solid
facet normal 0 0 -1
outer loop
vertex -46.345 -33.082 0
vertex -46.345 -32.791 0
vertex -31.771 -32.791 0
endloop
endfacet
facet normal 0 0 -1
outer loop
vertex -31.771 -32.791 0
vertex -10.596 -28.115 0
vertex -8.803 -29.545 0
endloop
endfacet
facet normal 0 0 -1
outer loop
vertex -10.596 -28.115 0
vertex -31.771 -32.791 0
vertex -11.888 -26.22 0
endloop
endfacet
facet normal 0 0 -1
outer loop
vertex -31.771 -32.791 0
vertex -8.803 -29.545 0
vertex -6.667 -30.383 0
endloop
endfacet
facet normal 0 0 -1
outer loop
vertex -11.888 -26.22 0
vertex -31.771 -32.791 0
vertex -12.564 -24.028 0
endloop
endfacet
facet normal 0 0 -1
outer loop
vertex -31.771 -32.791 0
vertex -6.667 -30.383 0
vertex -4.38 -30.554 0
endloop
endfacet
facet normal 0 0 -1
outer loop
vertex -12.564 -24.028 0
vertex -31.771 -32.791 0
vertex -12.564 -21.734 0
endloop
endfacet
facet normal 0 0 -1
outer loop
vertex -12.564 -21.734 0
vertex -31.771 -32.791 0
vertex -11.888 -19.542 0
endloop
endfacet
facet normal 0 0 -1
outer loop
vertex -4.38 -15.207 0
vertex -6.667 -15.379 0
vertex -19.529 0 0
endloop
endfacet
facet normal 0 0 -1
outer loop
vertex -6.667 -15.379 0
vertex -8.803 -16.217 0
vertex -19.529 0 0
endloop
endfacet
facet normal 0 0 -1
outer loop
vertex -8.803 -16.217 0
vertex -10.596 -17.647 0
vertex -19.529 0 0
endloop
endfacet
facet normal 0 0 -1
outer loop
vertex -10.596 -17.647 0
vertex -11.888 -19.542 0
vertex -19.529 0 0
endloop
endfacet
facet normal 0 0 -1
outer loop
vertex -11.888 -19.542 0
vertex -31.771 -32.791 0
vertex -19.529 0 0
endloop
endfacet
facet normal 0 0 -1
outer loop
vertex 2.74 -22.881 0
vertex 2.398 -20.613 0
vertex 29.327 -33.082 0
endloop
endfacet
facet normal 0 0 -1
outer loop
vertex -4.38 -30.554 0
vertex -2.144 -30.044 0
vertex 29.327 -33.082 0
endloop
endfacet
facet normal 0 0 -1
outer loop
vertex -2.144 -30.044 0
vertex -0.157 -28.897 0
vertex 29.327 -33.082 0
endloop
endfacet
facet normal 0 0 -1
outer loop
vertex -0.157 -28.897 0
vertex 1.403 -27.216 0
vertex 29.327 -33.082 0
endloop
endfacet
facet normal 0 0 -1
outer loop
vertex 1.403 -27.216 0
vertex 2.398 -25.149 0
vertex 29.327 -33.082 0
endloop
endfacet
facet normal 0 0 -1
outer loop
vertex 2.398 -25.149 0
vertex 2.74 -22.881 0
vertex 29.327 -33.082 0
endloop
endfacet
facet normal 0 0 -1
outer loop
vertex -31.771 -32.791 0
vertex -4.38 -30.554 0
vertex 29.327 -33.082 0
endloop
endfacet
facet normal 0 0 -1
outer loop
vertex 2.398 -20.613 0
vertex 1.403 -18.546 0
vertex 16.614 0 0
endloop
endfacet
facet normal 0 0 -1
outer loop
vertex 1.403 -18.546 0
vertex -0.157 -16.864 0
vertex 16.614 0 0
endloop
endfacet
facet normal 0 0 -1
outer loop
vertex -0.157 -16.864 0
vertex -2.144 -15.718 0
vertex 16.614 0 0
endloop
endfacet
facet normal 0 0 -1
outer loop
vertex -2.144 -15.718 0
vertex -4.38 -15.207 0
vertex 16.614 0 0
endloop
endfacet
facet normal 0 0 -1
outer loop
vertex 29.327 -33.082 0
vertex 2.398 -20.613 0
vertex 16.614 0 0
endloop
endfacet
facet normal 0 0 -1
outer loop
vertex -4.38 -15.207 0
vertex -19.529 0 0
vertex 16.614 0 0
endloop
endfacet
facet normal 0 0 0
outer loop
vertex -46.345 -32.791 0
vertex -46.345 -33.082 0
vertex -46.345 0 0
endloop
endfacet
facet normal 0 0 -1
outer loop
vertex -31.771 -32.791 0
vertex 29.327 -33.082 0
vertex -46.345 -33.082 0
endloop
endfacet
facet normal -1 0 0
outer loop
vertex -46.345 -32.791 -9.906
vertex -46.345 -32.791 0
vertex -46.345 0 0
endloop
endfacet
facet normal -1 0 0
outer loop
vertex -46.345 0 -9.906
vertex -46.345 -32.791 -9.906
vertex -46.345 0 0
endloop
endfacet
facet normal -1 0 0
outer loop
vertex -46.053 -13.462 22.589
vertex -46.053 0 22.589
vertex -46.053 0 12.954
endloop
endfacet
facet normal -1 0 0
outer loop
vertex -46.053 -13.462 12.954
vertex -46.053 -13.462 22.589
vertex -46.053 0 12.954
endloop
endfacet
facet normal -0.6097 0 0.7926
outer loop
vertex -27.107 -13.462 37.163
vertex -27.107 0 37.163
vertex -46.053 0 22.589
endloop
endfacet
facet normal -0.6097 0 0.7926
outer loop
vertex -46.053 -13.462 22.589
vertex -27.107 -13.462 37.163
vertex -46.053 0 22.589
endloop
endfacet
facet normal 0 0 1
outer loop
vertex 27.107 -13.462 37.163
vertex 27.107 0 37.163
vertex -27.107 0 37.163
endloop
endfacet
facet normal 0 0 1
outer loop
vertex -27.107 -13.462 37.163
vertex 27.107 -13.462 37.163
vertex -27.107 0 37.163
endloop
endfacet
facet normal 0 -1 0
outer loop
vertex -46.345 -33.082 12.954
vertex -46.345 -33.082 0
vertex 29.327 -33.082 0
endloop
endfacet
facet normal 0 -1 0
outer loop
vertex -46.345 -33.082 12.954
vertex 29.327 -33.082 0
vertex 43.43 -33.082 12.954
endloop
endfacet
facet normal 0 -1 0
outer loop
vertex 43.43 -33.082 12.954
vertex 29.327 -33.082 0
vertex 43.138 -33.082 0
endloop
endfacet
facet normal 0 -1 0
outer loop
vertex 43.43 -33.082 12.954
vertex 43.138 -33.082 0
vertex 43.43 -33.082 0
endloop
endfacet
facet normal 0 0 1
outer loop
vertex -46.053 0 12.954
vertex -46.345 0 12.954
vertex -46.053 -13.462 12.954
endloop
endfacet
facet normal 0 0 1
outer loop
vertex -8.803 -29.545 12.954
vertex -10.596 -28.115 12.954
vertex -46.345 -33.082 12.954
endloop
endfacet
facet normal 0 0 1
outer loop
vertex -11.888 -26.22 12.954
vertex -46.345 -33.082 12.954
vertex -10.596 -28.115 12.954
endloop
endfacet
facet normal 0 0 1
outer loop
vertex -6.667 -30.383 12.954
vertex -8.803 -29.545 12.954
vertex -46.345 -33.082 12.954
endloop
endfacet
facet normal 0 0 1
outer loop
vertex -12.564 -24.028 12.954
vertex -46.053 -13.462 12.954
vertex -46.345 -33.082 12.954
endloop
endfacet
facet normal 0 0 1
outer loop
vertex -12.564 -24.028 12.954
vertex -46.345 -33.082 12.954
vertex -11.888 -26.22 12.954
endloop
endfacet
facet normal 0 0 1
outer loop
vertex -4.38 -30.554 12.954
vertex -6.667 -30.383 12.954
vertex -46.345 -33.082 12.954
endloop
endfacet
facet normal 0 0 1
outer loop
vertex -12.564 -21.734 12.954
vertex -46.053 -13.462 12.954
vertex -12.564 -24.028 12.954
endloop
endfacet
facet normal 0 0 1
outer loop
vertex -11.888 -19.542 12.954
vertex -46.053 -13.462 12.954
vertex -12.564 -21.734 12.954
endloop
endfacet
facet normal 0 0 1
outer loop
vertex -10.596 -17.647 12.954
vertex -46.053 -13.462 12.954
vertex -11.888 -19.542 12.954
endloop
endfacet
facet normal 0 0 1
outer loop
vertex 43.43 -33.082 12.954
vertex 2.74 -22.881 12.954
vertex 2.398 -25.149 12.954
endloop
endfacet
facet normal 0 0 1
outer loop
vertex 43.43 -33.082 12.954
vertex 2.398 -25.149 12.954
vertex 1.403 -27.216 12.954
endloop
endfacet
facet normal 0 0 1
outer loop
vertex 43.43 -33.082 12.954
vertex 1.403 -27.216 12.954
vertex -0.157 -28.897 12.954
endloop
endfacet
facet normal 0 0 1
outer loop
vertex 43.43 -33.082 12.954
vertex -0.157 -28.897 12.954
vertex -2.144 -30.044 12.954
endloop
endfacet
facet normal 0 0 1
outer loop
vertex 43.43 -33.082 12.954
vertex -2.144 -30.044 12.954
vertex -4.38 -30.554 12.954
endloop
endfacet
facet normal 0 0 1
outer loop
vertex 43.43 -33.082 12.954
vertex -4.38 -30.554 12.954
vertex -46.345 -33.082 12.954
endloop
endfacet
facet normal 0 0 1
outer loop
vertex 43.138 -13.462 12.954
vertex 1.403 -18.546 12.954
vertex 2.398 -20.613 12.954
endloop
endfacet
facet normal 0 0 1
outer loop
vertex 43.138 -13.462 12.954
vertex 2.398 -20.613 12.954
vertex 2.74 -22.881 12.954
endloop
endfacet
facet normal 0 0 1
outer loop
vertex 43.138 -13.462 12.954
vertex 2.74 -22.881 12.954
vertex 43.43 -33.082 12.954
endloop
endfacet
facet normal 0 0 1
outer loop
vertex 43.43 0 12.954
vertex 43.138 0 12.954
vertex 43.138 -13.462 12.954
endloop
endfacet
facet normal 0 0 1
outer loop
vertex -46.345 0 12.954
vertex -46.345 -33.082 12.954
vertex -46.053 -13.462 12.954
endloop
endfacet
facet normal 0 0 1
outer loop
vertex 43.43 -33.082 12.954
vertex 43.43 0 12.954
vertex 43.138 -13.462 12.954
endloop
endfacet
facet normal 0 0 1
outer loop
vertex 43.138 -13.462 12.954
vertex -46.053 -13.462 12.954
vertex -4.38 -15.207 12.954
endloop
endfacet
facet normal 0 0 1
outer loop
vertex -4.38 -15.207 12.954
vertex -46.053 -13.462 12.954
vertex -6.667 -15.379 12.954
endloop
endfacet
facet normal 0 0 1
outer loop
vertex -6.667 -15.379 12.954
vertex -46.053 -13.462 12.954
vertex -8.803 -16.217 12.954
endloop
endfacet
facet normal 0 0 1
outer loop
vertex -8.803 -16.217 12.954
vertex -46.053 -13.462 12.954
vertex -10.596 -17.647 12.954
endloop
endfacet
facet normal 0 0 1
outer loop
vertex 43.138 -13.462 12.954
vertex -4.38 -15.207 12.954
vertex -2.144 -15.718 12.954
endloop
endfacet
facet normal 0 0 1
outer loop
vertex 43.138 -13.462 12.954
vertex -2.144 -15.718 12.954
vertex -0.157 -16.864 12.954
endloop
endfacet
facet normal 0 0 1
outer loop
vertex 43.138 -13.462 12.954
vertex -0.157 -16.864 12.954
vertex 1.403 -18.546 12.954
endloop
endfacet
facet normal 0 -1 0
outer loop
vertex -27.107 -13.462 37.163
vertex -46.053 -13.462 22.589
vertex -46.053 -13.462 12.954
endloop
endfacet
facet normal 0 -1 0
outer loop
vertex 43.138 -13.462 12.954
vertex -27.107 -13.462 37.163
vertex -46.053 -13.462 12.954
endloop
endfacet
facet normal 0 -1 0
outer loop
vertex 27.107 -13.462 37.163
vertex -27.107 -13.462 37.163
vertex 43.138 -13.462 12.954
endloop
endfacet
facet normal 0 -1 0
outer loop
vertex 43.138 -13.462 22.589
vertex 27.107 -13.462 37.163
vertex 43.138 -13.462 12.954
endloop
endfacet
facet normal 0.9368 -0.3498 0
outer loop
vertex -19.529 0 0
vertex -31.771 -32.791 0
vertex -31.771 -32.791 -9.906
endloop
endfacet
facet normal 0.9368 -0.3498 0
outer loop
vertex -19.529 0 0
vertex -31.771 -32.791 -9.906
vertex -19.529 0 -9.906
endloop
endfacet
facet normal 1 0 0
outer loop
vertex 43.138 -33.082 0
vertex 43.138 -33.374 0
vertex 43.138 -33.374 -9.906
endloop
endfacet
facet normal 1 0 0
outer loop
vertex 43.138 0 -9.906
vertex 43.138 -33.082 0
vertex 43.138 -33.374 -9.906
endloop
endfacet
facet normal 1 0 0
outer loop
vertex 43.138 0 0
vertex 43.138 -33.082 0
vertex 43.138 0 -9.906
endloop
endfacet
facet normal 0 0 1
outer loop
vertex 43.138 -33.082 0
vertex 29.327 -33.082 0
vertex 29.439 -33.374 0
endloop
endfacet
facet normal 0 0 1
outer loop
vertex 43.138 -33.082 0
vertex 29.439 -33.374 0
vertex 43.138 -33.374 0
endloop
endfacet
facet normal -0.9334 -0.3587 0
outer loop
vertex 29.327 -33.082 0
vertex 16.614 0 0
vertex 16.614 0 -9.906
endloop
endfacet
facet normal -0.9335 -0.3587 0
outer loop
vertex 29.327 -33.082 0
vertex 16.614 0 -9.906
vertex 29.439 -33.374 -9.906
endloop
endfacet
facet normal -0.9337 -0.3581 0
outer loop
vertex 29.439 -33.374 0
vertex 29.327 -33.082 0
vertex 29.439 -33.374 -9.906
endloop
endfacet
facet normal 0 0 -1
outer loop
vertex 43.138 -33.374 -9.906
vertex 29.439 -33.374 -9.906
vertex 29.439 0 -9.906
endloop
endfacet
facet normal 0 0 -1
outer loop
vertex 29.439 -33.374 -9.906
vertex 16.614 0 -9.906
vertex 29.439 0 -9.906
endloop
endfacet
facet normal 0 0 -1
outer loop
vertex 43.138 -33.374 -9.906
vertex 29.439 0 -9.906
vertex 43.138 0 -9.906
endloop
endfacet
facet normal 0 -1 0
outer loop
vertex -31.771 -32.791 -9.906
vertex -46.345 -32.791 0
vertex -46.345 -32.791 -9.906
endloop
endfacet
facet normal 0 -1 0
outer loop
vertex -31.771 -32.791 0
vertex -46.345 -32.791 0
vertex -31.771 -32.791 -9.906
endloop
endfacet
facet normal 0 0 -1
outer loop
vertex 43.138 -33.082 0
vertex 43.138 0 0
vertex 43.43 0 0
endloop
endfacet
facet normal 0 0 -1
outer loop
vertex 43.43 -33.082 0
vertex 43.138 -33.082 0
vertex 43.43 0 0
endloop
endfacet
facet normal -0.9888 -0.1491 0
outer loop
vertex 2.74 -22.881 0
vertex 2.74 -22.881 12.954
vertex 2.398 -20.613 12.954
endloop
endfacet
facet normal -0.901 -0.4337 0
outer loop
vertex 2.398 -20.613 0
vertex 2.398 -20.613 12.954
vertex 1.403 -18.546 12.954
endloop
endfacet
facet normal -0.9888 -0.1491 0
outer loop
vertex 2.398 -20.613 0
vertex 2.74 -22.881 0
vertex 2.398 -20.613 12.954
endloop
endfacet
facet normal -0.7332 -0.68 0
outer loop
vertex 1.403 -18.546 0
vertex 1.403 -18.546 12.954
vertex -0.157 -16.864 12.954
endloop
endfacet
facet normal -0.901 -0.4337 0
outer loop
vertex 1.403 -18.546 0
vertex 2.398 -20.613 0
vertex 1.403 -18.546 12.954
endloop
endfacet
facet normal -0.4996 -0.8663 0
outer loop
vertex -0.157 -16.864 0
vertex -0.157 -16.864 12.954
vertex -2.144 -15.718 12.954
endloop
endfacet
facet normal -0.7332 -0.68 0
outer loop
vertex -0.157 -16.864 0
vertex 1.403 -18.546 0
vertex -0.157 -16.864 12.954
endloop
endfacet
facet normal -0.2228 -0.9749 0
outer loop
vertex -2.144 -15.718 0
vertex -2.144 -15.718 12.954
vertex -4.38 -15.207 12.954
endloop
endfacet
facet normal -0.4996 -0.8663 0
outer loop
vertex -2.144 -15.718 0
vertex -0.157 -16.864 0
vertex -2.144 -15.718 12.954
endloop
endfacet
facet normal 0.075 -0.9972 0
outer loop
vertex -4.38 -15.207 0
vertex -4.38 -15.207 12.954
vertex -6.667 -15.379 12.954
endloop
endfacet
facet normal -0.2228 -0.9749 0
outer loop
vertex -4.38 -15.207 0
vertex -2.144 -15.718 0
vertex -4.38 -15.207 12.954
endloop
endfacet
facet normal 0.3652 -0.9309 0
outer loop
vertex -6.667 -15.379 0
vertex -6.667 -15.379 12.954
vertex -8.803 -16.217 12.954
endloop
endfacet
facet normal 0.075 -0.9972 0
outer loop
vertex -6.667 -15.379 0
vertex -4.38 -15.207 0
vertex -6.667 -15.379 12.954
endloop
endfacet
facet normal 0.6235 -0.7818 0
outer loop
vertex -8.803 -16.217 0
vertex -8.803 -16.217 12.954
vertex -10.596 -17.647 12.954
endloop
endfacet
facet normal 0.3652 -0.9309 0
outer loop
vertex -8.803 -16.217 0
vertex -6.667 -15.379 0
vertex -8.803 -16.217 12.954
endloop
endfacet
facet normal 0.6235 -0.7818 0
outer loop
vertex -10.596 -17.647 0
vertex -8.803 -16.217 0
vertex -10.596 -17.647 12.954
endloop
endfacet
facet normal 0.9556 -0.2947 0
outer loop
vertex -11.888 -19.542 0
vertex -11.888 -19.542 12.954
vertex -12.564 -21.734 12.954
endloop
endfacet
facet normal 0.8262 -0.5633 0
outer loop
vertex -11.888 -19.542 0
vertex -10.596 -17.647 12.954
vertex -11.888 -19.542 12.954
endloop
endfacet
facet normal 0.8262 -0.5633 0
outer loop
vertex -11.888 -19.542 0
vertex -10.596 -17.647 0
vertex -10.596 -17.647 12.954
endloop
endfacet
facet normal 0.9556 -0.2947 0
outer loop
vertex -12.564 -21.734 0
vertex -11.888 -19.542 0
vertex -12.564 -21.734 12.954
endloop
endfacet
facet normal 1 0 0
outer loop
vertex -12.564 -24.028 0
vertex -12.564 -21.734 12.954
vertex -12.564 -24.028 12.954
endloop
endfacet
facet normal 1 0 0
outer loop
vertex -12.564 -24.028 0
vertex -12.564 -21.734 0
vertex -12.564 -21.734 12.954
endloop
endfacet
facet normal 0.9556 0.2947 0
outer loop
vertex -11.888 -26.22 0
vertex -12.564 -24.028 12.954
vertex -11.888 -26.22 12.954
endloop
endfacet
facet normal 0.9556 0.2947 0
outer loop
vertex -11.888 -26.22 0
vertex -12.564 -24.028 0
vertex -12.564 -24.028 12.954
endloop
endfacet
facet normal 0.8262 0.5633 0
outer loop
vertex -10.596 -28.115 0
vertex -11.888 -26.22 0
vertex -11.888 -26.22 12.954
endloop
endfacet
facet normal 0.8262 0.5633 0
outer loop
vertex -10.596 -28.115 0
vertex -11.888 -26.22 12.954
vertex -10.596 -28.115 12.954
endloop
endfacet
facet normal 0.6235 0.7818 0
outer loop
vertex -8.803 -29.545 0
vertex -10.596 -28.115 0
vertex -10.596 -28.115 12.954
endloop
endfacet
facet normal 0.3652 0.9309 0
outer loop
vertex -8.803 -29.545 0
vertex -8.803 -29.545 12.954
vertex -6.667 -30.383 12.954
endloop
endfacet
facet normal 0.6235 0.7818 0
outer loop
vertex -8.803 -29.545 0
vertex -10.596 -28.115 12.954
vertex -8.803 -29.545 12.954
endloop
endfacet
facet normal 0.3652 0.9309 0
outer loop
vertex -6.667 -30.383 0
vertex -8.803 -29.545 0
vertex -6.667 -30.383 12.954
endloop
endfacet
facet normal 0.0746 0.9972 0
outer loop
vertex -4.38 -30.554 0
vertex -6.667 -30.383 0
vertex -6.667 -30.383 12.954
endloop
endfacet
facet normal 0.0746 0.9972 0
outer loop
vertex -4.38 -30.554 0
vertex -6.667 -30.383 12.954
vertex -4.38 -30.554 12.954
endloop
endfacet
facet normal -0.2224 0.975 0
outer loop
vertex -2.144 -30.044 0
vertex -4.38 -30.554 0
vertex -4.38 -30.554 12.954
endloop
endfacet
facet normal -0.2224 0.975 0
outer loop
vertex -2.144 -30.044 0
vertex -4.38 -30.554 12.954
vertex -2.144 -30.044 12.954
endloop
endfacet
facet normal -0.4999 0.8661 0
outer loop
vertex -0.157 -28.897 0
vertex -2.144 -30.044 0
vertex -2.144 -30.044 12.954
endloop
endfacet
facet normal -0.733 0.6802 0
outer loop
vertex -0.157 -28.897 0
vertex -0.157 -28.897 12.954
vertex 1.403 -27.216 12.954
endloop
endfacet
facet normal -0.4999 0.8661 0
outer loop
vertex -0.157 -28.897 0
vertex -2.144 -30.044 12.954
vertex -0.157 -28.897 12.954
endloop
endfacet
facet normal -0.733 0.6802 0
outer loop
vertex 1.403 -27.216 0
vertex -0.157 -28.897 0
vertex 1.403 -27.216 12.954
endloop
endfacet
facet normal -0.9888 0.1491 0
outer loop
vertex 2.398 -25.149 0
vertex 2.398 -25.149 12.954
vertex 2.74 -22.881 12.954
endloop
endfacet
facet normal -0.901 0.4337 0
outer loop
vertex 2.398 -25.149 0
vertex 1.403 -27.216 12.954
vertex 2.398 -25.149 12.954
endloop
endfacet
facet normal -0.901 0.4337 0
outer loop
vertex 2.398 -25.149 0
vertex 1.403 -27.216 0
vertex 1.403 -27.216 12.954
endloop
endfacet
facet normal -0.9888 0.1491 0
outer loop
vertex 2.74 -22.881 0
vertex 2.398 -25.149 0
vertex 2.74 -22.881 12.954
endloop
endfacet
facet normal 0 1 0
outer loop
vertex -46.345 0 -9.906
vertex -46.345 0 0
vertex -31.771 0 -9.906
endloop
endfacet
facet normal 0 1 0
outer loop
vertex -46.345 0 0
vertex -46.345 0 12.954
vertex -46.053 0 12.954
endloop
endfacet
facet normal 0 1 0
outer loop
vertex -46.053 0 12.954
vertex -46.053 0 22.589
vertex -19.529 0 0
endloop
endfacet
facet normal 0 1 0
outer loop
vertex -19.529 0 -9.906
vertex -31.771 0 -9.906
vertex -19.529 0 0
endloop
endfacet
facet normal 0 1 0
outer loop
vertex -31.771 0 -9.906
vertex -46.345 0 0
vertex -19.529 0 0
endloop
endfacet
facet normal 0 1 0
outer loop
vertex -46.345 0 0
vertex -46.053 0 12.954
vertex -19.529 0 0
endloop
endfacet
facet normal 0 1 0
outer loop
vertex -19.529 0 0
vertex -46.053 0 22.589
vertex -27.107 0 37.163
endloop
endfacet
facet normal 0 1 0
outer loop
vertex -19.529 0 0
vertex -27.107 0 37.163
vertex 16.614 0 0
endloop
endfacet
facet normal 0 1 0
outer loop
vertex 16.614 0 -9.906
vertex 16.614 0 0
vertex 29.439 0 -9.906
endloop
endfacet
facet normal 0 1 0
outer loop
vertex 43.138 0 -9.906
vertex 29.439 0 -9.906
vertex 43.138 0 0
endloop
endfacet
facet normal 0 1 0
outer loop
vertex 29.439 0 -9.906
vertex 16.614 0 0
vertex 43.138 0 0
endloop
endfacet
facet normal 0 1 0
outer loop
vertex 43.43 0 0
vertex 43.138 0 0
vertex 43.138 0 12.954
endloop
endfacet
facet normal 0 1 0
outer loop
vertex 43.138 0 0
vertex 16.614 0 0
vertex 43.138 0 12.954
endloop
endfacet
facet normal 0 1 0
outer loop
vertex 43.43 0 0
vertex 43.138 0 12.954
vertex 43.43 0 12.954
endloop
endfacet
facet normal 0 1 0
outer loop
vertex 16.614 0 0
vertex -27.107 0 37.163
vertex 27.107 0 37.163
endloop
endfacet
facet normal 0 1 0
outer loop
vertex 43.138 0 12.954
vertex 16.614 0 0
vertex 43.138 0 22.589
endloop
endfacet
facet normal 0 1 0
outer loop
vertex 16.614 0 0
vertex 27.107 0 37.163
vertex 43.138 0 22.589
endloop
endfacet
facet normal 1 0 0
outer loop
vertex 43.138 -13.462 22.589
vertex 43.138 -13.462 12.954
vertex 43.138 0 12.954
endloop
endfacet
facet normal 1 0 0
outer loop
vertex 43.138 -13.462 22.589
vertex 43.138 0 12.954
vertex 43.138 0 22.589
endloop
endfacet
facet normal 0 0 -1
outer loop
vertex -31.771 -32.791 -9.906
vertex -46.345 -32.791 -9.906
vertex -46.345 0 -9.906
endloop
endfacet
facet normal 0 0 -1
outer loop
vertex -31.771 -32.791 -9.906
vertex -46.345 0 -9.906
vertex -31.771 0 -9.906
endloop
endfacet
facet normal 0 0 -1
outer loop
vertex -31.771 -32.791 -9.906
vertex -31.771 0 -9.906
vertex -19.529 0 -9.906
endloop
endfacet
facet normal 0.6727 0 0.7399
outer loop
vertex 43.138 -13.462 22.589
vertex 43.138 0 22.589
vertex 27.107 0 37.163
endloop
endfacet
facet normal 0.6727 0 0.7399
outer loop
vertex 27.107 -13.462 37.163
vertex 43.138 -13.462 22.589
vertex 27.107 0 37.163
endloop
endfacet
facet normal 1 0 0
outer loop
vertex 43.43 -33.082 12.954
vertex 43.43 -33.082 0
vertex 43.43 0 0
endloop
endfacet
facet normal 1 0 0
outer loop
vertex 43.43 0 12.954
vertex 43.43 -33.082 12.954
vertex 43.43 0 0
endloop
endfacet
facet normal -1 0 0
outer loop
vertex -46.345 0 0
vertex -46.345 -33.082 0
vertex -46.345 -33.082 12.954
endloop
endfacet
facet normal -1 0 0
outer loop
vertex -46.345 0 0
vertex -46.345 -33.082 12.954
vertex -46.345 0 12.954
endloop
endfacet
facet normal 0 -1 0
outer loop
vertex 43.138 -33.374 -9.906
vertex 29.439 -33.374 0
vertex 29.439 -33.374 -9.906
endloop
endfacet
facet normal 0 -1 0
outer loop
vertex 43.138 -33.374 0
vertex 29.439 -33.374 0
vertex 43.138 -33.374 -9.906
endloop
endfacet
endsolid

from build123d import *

# Parameters (mm, degrees)
F1_DEPTH = 13.462
F2_W     = 89.7744297981
F2_H     = 33.0824591219
F3_DEPTH = 12.954
F4_R     = 7.6951725226
F5_DEPTH = 63.5
F6_W     = 14.5737677813
F6_H     = 32.7909812331
F6_W_2   = 13.6993471533
F6_H_2   = 33.3739332855
F7_DEPTH = 9.906


with BuildPart() as f1:
    # F0 (on Front) → F1 (new body)
    with BuildSketch(Plane.XZ):
        Polygon((-27.1072126925, 37.1631160378), (-46.0531152785, 22.5893463939), (-46.0531152785, 0), (43.1383624673, 0), (43.1383624673, 22.5893463939), (27.1072126925, 37.1631160378), align=None)
    extrude(amount=F1_DEPTH)

    # F2 (on Top) → F3 (join)
    with BuildSketch(Plane.XY):
        with Locations((-1.4573782682, -16.541229561)):
            Rectangle(F2_W, F2_H)
    extrude(amount=F3_DEPTH)

    # F4 (on Top) → F5 (cut)
    with BuildSketch(Plane.XY):
        with Locations((-4.9550817348, -22.8808205575)):
            Circle(F4_R)
    extrude(amount=F5_DEPTH, mode=Mode.SUBTRACT)

    # F6 (on Top) → F7 (join)
    with BuildSketch(Plane.XY):
        with Locations((-39.0577055514, -16.3954906166)):
            Rectangle(F6_W, F6_H)
        Polygon((-31.7708216608, 0), (-31.7708216608, -32.7909812331), (-19.5288527757, 0), align=None)
        with Locations((36.2886888906, -16.6869666427)):
            Rectangle(F6_W_2, F6_H_2)
        Polygon((16.6140999645, 0), (29.439015314, -33.3739332855), (29.439015314, 0), align=None)
    extrude(amount=-F7_DEPTH)


solid = f1.part
